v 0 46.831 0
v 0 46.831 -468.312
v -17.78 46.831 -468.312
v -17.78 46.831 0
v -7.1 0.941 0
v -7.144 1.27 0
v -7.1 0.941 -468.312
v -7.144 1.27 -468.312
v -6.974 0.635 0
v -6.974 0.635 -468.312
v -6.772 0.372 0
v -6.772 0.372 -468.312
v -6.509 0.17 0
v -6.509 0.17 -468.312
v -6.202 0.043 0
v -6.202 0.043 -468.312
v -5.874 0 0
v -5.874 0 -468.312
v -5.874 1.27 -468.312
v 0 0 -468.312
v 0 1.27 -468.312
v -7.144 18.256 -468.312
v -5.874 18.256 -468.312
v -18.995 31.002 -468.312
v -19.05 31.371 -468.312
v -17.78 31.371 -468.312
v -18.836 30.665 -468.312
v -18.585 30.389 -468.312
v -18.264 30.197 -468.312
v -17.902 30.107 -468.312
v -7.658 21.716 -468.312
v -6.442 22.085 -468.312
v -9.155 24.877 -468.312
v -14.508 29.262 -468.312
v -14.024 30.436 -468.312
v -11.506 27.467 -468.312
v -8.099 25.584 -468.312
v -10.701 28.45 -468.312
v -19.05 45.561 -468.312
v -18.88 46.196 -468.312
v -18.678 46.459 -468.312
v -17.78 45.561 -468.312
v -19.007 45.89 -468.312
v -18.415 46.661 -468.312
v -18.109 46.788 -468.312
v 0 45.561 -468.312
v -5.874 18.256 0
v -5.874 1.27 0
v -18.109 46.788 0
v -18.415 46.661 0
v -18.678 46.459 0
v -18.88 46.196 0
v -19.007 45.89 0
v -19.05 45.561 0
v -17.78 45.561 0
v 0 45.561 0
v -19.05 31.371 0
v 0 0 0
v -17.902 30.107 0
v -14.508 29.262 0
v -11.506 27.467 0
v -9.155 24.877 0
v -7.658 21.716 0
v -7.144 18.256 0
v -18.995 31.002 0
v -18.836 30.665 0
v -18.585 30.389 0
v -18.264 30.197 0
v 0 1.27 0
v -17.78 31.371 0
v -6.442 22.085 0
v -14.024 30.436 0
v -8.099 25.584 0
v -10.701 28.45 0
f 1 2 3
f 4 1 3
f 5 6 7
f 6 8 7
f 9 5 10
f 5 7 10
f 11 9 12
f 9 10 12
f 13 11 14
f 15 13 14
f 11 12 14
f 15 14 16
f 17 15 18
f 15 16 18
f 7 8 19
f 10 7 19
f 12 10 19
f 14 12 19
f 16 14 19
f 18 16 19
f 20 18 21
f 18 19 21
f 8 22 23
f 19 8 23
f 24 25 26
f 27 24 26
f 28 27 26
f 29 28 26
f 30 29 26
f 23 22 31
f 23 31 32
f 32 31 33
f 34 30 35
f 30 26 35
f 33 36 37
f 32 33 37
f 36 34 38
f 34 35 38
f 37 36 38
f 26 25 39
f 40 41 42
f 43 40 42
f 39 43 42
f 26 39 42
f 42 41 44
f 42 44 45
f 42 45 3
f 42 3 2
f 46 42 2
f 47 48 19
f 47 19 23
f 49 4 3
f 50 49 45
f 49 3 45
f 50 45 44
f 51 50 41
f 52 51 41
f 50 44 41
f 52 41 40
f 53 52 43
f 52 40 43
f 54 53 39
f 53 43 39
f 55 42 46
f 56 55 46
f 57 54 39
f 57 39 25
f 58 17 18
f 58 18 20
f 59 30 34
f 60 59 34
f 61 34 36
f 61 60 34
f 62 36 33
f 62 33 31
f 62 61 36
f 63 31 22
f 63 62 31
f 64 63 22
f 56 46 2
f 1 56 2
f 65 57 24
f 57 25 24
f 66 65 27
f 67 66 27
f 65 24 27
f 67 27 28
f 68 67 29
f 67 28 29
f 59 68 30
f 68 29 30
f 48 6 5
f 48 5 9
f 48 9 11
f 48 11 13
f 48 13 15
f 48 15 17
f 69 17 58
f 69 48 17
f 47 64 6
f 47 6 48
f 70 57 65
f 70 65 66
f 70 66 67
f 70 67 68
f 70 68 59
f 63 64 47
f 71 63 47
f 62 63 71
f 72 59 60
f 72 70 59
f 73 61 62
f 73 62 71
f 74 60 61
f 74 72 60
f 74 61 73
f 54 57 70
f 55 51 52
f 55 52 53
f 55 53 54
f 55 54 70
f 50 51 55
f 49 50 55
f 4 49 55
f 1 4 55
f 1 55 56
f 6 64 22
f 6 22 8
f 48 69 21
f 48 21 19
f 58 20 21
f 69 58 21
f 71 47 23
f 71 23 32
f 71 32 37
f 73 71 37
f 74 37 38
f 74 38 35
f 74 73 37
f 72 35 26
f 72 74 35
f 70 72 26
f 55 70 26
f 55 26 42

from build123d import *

# Parameters (mm, degrees)
EXTRUDE_THIN1_DEPTH = 468.3125
FILLET1_R           = 1.27


with BuildPart() as part:
    # Sketch1 → Extrude-Thin1 (new body)
    with BuildSketch(Plane.XY):
        with BuildLine():
            Line((0, 46.83125), (-19.05, 46.83125))
            Line((-19.05, 46.83125), (-19.05, 30.1625))
            ThreePointArc((-19.05, 30.1625), (-10.631009886, 26.675240114), (-7.14375, 18.25625))
            Line((-7.14375, 18.25625), (-7.14375, 0))
            Line((-7.14375, 0), (0, 0))
            Line((0, 0), (0, 1.27))
            Line((0, 1.27), (-5.87375, 1.27))
            Line((-5.87375, 1.27), (-5.87375, 18.25625))
            ThreePointArc((-5.87375, 18.25625), (-9.294299063, 27.112878212), (-17.78, 31.371152366))
            Line((-17.78, 31.371152366), (-17.78, 45.56125))
            Line((-17.78, 45.56125), (0, 45.56125))
            Line((0, 45.56125), (0, 46.83125))
        make_face()
    extrude(amount=-EXTRUDE_THIN1_DEPTH)

    # Fillet1
    fillet1_edges = [part.edges().sort_by_distance(p)[0] for p in [
        (-7.14375, 0, -234.15625),
        (-19.05, 30.1625, -234.15625),
        (-19.05, 46.83125, -234.15625),
    ]]
    fillet(fillet1_edges, radius=FILLET1_R)


solid = part.part
